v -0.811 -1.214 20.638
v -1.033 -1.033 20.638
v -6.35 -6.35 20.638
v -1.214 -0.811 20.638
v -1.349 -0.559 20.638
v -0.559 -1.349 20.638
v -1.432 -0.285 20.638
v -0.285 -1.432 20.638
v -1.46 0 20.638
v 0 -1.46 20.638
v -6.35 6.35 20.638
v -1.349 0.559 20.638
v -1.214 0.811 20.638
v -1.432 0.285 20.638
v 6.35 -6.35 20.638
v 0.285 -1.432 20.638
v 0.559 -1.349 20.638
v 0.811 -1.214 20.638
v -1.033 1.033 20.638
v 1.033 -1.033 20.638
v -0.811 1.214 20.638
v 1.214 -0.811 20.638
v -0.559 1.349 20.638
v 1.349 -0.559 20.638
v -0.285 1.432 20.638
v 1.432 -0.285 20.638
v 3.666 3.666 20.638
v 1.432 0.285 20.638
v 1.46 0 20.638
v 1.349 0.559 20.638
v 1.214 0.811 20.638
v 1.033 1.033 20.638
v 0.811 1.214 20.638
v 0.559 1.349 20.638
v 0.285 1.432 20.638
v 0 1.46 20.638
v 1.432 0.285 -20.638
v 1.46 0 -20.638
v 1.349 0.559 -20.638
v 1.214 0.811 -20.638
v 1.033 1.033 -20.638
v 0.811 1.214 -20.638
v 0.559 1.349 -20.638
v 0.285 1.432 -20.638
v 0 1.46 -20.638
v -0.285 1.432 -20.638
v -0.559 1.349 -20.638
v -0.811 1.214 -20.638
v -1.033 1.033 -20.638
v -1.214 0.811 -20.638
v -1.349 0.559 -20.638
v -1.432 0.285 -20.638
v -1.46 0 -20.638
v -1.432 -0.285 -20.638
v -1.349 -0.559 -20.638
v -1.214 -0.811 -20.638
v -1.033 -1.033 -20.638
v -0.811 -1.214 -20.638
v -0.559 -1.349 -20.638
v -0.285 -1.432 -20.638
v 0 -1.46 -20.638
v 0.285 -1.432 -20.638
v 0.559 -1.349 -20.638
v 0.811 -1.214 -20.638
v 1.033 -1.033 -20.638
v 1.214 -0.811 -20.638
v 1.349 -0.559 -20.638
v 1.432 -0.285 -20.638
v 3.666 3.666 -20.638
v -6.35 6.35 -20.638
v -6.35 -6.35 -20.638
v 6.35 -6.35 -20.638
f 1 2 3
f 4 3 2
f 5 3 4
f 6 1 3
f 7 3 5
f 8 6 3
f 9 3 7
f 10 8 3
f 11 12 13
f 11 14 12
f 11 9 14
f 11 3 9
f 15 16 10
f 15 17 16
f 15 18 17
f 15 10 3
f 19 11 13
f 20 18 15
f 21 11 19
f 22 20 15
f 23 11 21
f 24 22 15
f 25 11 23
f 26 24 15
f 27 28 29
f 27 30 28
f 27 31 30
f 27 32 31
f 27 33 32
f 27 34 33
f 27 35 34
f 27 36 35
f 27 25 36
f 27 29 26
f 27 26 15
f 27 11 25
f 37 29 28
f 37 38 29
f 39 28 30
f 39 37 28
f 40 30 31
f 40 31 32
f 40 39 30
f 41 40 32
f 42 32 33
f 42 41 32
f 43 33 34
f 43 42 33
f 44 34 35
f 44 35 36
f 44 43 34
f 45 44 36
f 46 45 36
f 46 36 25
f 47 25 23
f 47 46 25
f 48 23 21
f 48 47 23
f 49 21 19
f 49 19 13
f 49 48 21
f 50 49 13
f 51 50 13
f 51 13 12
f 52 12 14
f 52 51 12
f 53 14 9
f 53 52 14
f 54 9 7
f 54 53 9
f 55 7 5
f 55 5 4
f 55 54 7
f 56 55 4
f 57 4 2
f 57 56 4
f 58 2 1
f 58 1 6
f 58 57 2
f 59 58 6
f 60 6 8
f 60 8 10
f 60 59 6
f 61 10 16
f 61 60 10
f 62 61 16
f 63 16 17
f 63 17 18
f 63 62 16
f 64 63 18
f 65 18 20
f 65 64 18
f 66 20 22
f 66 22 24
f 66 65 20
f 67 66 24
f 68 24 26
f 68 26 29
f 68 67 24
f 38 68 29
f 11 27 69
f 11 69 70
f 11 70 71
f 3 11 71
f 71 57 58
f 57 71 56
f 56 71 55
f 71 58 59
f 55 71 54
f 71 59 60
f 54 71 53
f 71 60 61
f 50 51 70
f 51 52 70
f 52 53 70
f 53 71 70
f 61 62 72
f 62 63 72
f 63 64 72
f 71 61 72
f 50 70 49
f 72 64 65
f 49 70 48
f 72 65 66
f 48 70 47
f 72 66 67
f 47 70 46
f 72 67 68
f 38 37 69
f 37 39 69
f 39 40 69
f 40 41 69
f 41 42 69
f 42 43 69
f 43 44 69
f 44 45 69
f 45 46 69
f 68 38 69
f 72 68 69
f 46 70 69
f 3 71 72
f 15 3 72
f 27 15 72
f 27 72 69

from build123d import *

# Parameters (mm, degrees)
F0_R     = 1.4605
F1_DEPTH = 20.6375


# Not quite as in the source:
# - a length typed as a fraction of an inch, garbled in the dataset ("3 / 203.2 mm" for 3/8 in), is restored


with BuildPart() as f1:
    # F0 (on Top) → F1 (new body, symmetric)
    with BuildSketch(Plane.XY):
        Polygon((-6.35, -6.35), (6.35, -6.35), (3.6661742094, 3.6661742094), (-6.35, 6.35), align=None)
        Circle(F0_R, mode=Mode.SUBTRACT)
    extrude(amount=F1_DEPTH, both=True)


solid = f1.part
